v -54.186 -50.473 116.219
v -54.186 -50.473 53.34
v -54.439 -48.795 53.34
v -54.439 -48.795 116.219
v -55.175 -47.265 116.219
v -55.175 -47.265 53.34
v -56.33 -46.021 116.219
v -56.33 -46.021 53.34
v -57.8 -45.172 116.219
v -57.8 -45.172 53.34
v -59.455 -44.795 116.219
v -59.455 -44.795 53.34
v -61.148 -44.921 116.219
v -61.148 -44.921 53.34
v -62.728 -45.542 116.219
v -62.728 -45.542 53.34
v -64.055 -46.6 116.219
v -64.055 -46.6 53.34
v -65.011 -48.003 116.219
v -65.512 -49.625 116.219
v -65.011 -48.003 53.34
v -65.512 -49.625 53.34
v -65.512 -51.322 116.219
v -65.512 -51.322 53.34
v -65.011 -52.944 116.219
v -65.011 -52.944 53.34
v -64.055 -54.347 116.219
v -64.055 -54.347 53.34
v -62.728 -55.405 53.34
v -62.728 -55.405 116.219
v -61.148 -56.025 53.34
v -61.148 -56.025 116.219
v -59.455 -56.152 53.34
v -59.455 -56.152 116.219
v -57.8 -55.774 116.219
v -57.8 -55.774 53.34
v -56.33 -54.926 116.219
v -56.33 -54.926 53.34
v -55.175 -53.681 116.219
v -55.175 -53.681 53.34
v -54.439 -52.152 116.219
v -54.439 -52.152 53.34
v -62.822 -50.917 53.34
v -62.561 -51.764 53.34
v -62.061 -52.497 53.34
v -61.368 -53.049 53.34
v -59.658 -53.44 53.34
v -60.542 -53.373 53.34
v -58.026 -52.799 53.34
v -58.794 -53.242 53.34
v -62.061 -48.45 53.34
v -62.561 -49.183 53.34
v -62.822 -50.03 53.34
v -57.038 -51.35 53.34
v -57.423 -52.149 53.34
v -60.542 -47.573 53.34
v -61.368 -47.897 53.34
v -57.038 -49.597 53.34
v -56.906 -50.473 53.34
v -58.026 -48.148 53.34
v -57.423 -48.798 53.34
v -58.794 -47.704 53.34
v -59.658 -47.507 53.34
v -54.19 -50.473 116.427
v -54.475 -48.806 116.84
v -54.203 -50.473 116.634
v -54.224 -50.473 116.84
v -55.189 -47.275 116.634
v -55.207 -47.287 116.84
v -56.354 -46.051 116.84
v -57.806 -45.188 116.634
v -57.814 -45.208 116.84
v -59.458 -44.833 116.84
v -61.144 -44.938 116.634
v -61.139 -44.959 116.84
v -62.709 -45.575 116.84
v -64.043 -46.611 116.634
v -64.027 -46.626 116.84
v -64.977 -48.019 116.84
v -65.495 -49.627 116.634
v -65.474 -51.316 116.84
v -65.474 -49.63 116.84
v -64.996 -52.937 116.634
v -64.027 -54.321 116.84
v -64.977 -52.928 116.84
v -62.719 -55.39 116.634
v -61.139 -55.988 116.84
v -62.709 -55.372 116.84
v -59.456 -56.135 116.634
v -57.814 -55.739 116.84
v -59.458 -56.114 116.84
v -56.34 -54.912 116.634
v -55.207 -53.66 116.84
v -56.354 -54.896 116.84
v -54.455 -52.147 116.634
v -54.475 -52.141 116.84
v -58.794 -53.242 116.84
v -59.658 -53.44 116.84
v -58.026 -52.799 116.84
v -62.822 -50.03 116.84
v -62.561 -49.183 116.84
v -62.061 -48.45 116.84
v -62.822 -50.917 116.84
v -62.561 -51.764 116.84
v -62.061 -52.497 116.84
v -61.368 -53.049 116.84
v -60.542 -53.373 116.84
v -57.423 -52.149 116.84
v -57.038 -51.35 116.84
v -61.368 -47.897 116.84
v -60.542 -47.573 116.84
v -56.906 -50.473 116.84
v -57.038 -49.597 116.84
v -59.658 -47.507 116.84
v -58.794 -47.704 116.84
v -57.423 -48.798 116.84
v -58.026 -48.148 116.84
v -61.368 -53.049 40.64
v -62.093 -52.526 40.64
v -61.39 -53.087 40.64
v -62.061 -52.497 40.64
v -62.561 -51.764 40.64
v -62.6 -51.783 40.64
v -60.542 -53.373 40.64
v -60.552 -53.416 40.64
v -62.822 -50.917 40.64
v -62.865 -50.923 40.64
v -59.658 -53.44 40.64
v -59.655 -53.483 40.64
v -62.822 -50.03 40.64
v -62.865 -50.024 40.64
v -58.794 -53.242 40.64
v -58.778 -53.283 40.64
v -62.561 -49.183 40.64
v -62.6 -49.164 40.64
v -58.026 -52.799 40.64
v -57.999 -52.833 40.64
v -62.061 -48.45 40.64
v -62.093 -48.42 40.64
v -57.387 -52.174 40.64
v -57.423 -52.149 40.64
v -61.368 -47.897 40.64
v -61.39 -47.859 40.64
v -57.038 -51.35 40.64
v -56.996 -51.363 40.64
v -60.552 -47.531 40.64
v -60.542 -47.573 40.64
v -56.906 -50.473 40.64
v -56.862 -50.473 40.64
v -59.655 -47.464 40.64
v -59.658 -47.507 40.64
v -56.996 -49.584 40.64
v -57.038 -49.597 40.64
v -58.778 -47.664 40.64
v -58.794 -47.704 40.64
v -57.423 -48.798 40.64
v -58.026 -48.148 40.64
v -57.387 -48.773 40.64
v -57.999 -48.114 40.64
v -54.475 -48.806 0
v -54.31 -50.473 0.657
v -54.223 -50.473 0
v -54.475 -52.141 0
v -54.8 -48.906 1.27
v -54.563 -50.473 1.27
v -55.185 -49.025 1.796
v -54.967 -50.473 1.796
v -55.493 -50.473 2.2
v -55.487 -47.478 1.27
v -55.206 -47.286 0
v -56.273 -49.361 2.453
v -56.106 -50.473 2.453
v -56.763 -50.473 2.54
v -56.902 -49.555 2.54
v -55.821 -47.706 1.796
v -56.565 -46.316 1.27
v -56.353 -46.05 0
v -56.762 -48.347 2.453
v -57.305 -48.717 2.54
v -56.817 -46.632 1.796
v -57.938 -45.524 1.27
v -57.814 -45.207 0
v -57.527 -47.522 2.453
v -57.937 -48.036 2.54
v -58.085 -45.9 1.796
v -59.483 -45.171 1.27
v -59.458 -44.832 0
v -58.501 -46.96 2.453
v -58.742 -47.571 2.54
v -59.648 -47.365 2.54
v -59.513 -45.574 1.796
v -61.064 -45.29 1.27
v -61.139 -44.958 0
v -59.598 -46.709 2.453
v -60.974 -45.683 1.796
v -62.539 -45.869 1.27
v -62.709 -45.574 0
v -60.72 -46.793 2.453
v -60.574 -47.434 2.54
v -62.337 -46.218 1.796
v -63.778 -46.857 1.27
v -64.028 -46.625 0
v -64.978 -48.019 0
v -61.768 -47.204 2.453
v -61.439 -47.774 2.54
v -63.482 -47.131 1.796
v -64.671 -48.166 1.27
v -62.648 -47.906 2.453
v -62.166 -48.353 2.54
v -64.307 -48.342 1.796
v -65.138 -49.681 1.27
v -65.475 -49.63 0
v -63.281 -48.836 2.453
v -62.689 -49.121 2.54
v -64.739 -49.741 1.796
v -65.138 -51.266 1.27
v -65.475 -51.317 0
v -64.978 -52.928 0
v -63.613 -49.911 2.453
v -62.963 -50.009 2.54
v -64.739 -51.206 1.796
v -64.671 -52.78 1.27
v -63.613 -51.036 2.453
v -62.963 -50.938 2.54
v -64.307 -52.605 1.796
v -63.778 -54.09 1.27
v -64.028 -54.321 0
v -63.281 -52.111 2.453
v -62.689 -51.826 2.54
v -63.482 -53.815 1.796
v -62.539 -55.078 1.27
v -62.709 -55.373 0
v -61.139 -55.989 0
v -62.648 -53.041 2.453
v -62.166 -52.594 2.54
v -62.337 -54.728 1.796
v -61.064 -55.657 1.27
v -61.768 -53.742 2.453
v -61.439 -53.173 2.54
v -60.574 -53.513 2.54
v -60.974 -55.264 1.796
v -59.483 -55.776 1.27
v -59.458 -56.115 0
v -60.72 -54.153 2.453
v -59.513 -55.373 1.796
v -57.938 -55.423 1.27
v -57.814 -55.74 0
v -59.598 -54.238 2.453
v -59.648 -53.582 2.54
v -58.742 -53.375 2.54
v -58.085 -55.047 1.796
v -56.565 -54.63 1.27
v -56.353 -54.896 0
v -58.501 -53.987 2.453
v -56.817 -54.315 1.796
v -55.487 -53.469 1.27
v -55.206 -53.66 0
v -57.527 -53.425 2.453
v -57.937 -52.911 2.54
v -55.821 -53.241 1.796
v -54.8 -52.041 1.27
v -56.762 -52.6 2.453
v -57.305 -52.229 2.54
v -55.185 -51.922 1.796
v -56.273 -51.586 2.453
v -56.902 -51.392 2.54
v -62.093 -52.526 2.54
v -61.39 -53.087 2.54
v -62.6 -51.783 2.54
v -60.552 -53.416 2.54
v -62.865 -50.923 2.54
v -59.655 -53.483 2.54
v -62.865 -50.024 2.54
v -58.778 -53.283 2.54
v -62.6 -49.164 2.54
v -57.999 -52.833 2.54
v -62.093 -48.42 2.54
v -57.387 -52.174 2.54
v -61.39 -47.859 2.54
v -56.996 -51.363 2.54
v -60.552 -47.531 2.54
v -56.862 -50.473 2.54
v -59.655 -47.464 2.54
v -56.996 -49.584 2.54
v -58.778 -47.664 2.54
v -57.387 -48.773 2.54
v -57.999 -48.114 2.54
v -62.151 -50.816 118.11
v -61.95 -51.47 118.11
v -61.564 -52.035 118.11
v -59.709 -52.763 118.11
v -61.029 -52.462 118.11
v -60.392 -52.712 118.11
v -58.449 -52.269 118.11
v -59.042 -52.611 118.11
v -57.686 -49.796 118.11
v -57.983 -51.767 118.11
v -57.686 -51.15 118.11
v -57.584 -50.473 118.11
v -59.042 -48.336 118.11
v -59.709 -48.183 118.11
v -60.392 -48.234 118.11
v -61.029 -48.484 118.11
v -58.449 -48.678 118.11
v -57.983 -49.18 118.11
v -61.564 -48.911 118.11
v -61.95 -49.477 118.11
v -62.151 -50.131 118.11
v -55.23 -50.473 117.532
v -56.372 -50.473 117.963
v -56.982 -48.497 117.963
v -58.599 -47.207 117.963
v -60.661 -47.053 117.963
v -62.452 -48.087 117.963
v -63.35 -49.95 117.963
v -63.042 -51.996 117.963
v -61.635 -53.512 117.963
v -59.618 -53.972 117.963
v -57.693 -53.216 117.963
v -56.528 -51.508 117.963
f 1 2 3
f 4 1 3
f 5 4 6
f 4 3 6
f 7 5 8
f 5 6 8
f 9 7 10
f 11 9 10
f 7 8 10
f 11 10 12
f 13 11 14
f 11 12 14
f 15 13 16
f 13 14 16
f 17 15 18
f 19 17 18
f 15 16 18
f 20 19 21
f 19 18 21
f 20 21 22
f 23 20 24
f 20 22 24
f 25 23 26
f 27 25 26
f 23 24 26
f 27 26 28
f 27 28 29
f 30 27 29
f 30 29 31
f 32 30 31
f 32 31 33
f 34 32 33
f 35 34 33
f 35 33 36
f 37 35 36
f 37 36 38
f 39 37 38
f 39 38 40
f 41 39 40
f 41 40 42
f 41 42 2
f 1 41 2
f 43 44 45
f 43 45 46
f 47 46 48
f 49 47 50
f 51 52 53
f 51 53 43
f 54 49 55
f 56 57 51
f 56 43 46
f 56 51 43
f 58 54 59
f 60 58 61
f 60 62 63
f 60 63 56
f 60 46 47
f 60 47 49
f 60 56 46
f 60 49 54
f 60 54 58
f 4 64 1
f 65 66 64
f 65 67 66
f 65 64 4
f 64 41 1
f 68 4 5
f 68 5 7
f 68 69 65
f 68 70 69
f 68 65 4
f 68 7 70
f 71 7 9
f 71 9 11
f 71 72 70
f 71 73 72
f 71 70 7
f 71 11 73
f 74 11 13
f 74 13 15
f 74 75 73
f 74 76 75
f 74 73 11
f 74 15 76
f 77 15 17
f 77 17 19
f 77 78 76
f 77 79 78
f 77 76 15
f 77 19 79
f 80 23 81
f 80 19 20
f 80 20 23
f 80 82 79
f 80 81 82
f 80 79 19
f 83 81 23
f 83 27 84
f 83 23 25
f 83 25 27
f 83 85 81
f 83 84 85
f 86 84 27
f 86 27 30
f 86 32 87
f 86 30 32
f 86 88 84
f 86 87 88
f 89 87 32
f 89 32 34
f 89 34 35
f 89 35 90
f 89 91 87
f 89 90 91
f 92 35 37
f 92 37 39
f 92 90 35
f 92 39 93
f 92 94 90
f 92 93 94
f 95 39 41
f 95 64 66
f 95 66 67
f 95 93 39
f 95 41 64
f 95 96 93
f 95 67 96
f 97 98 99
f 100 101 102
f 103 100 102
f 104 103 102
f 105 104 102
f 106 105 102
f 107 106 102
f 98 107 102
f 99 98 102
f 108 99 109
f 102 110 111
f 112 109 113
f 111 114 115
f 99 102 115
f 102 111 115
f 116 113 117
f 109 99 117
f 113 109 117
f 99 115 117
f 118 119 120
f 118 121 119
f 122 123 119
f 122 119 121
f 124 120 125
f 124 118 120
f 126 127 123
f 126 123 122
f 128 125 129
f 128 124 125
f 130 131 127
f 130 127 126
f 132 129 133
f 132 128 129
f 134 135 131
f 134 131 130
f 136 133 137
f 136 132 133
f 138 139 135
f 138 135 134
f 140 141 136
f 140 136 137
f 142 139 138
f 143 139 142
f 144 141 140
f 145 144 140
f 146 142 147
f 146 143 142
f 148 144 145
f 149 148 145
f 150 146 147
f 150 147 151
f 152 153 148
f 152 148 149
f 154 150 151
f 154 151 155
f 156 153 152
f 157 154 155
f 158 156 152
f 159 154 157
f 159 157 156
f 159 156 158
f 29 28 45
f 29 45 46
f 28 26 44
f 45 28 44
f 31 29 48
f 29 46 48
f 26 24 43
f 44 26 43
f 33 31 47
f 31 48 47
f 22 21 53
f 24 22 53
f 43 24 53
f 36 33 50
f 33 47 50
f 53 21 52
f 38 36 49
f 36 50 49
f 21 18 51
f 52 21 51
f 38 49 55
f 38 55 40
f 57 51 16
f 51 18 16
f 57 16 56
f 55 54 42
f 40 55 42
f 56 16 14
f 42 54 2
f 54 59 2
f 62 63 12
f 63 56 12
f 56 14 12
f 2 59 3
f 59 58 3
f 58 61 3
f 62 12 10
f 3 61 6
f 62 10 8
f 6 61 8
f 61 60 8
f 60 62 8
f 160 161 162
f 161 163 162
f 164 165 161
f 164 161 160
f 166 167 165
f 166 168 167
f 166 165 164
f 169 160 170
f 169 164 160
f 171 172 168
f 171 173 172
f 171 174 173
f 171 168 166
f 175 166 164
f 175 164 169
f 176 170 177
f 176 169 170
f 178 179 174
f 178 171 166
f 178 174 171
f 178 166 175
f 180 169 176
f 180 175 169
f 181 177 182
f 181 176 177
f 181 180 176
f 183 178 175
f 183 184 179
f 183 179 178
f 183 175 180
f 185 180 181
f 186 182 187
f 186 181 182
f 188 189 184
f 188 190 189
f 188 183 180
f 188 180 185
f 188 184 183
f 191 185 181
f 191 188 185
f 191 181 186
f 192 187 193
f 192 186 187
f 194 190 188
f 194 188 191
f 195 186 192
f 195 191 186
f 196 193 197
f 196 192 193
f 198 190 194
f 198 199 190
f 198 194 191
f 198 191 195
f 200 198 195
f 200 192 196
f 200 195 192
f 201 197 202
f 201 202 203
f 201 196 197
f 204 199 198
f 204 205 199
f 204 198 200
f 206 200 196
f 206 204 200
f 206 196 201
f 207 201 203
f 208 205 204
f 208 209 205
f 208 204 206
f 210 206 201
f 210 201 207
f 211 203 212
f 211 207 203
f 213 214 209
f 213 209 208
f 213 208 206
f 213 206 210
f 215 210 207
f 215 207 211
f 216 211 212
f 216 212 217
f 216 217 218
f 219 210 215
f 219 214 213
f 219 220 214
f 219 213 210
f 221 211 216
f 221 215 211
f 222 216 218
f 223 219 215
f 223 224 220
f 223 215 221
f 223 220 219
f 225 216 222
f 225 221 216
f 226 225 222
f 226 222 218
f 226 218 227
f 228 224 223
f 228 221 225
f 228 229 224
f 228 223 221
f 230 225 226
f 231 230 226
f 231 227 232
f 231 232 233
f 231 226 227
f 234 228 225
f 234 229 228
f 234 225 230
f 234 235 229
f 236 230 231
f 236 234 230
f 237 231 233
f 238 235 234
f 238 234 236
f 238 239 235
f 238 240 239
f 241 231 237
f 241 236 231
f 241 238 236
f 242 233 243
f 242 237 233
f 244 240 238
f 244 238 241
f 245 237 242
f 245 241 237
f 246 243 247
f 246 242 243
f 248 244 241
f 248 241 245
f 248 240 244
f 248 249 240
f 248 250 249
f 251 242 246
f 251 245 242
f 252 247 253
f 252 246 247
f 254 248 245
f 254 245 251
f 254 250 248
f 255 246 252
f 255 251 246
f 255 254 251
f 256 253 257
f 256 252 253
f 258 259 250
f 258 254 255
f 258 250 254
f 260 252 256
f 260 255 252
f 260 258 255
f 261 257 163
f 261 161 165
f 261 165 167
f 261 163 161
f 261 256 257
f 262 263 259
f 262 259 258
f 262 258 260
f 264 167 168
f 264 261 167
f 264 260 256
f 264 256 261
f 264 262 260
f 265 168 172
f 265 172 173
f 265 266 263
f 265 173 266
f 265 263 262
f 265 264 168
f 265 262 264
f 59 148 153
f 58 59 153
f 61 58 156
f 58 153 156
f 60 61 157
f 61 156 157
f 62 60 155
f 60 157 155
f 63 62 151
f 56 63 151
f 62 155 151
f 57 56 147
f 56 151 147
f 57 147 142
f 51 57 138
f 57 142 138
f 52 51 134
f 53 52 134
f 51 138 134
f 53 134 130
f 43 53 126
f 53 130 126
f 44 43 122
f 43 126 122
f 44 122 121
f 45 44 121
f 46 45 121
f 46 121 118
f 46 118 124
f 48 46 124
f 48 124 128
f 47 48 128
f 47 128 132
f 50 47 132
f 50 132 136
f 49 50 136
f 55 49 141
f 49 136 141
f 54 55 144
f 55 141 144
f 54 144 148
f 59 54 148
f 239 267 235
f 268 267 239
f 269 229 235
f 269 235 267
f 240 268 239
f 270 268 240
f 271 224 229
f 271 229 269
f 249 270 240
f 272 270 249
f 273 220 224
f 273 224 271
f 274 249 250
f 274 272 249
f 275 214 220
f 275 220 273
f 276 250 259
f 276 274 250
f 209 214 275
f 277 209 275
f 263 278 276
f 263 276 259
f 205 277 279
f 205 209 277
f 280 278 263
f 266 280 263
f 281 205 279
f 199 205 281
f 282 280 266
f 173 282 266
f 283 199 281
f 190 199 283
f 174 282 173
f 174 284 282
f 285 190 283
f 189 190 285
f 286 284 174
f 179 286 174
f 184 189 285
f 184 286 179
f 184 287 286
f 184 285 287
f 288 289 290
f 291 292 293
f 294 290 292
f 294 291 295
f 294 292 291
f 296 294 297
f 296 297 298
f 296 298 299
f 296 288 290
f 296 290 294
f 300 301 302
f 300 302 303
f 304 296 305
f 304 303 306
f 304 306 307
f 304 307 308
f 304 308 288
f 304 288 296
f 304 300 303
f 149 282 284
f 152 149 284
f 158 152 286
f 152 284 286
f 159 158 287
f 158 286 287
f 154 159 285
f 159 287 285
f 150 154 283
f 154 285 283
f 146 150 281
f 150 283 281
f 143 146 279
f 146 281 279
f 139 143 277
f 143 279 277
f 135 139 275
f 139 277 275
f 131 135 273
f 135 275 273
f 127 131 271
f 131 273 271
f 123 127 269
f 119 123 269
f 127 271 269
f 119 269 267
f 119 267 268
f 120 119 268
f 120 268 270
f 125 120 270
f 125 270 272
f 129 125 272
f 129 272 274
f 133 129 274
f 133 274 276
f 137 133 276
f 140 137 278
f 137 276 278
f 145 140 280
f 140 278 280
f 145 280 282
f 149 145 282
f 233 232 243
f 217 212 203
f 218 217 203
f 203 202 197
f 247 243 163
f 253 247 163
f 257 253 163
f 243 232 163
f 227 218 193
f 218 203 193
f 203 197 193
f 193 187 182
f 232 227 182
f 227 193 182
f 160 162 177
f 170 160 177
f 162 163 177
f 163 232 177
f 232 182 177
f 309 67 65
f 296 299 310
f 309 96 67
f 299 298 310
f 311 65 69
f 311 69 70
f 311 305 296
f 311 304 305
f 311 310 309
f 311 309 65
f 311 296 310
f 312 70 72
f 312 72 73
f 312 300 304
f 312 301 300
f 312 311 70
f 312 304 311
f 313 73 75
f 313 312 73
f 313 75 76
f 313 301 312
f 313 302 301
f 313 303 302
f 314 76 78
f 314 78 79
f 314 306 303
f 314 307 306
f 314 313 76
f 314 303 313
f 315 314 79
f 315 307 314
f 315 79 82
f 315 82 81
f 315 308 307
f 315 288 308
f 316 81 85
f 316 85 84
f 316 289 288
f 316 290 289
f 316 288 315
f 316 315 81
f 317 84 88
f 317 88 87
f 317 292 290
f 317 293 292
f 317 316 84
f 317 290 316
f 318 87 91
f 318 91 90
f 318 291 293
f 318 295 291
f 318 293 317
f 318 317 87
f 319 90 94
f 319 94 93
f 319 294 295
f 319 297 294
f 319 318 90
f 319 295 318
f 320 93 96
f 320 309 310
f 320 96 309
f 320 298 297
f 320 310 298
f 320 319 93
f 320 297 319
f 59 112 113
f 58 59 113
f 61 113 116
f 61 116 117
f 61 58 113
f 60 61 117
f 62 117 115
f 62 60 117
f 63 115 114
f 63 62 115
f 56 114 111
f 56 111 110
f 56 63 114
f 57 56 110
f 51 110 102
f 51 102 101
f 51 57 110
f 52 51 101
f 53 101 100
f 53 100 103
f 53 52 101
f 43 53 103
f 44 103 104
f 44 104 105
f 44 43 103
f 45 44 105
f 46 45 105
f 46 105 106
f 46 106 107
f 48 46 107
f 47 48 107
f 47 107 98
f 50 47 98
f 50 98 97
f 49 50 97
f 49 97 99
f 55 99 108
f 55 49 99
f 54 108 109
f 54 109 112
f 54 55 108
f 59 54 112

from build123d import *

# Parameters (mm, degrees)
F0_R      = 5.6573529482
F1_DEPTH  = 2.54
F2_R      = 2.53999
F3_R      = 3.0182712291
F4_DEPTH  = 38.1
F5_R      = 2.9745722731
F6_DEPTH  = 12.7
F7_R      = 5.6947098188
F7_R_2    = 2.9745722731
F8_DEPTH  = 63.5
F10_R     = 5.6566477781
F11_DEPTH = 1.27


# Not quite as in the source:
# - a fillet or chamfer that OpenCascade refuses, or shapes differently, is made with other operations: its cross-section is extruded or revolved along the edge and cut away or added
# - a fillet or chamfer is up to 0.001 mm smaller than in the source, because OpenCascade refuses the exact size
# - the program builds the solid bodies; features that only make, move or delete a surface that nothing else refers to are left out


with BuildPart() as f1:
    # F0 (on Top) → F1 (new body)
    with BuildSketch(Plane.XY):
        with Locations((-59.8805323243, -50.4733622074)):
            Circle(F0_R)
    extrude(amount=F1_DEPTH)

    # F2 (radius 2.54 in the source; OpenCascade refuses exactly that, so slightly less here)
    f2_edges = [f1.edges().sort_by_distance(p)[0] for p in [
        (-65.537885, -50.473362, 2.54),
    ]]
    fillet(f2_edges, radius=F2_R)

    # F3 (on face) → F4 (join)
    with BuildSketch(Plane.XY.offset(2.54)):
        with Locations((-59.8805323243, -50.4733622074)):
            Circle(F3_R)
    extrude(amount=F4_DEPTH)

    # F5 (on face) → F6 (join)
    with BuildSketch(Plane.XY.offset(40.64)):
        with Locations((-59.8805323243, -50.4733622074)):
            Circle(F5_R)
    extrude(amount=F6_DEPTH)


with BuildPart() as f8:
    # F7 (on face) → F8 (new body)
    with BuildSketch(Plane.XY.offset(53.34)):
        with Locations((-59.8805323243, -50.4733622074)):
            Circle(F7_R)
        with Locations((-59.8805323243, -50.4733622074)):
            Circle(F7_R_2, mode=Mode.SUBTRACT)
    extrude(amount=F8_DEPTH)

    # F10 (on face) → F11 (join)
    with BuildSketch(Plane.XY.offset(116.84)):
        with Locations((-59.8805323243, -50.4733622074)):
            Circle(F10_R)
    extrude(amount=F11_DEPTH)

    # F12: fillet of radius 5.08 on 2 edges, made by hand

    # F12_s1 → F12_t2 (revolve, cut)
    with BuildSketch(Plane.XZ.offset(50.4733622074)):
        with BuildLine():
            ThreePointArc((-54.2238845462, 116.84), (-55.7879374871, 117.7819048812), (-57.5839887113, 118.11))
            Line((-57.5839887113, 118.11), (-54.2238845462, 118.11))
            Line((-54.2238845462, 118.11), (-54.2238845462, 116.84))
        make_face()
    revolve(axis=Axis((-59.8805323243, -50.4733622074, 118.11), (0, 0, 1)), mode=Mode.SUBTRACT)

    # F12_s3 → F12_t4 (revolve, cut)
    with BuildSketch(Plane.XZ.offset(50.4733622074)):
        with BuildLine():
            ThreePointArc((-54.1858225055, 116.2193055383), (-54.1953469443, 116.5302357289), (-54.2238845462, 116.84))
            Line((-54.2238845462, 116.84), (-54.1858225055, 116.84))
            Line((-54.1858225055, 116.84), (-54.1858225055, 116.2193055383))
        make_face()
    revolve(axis=Axis((-59.8805323243, -50.4733622074, 116.84), (0, 0, 1)), mode=Mode.SUBTRACT)


solid = Compound([f1.part, f8.part])
